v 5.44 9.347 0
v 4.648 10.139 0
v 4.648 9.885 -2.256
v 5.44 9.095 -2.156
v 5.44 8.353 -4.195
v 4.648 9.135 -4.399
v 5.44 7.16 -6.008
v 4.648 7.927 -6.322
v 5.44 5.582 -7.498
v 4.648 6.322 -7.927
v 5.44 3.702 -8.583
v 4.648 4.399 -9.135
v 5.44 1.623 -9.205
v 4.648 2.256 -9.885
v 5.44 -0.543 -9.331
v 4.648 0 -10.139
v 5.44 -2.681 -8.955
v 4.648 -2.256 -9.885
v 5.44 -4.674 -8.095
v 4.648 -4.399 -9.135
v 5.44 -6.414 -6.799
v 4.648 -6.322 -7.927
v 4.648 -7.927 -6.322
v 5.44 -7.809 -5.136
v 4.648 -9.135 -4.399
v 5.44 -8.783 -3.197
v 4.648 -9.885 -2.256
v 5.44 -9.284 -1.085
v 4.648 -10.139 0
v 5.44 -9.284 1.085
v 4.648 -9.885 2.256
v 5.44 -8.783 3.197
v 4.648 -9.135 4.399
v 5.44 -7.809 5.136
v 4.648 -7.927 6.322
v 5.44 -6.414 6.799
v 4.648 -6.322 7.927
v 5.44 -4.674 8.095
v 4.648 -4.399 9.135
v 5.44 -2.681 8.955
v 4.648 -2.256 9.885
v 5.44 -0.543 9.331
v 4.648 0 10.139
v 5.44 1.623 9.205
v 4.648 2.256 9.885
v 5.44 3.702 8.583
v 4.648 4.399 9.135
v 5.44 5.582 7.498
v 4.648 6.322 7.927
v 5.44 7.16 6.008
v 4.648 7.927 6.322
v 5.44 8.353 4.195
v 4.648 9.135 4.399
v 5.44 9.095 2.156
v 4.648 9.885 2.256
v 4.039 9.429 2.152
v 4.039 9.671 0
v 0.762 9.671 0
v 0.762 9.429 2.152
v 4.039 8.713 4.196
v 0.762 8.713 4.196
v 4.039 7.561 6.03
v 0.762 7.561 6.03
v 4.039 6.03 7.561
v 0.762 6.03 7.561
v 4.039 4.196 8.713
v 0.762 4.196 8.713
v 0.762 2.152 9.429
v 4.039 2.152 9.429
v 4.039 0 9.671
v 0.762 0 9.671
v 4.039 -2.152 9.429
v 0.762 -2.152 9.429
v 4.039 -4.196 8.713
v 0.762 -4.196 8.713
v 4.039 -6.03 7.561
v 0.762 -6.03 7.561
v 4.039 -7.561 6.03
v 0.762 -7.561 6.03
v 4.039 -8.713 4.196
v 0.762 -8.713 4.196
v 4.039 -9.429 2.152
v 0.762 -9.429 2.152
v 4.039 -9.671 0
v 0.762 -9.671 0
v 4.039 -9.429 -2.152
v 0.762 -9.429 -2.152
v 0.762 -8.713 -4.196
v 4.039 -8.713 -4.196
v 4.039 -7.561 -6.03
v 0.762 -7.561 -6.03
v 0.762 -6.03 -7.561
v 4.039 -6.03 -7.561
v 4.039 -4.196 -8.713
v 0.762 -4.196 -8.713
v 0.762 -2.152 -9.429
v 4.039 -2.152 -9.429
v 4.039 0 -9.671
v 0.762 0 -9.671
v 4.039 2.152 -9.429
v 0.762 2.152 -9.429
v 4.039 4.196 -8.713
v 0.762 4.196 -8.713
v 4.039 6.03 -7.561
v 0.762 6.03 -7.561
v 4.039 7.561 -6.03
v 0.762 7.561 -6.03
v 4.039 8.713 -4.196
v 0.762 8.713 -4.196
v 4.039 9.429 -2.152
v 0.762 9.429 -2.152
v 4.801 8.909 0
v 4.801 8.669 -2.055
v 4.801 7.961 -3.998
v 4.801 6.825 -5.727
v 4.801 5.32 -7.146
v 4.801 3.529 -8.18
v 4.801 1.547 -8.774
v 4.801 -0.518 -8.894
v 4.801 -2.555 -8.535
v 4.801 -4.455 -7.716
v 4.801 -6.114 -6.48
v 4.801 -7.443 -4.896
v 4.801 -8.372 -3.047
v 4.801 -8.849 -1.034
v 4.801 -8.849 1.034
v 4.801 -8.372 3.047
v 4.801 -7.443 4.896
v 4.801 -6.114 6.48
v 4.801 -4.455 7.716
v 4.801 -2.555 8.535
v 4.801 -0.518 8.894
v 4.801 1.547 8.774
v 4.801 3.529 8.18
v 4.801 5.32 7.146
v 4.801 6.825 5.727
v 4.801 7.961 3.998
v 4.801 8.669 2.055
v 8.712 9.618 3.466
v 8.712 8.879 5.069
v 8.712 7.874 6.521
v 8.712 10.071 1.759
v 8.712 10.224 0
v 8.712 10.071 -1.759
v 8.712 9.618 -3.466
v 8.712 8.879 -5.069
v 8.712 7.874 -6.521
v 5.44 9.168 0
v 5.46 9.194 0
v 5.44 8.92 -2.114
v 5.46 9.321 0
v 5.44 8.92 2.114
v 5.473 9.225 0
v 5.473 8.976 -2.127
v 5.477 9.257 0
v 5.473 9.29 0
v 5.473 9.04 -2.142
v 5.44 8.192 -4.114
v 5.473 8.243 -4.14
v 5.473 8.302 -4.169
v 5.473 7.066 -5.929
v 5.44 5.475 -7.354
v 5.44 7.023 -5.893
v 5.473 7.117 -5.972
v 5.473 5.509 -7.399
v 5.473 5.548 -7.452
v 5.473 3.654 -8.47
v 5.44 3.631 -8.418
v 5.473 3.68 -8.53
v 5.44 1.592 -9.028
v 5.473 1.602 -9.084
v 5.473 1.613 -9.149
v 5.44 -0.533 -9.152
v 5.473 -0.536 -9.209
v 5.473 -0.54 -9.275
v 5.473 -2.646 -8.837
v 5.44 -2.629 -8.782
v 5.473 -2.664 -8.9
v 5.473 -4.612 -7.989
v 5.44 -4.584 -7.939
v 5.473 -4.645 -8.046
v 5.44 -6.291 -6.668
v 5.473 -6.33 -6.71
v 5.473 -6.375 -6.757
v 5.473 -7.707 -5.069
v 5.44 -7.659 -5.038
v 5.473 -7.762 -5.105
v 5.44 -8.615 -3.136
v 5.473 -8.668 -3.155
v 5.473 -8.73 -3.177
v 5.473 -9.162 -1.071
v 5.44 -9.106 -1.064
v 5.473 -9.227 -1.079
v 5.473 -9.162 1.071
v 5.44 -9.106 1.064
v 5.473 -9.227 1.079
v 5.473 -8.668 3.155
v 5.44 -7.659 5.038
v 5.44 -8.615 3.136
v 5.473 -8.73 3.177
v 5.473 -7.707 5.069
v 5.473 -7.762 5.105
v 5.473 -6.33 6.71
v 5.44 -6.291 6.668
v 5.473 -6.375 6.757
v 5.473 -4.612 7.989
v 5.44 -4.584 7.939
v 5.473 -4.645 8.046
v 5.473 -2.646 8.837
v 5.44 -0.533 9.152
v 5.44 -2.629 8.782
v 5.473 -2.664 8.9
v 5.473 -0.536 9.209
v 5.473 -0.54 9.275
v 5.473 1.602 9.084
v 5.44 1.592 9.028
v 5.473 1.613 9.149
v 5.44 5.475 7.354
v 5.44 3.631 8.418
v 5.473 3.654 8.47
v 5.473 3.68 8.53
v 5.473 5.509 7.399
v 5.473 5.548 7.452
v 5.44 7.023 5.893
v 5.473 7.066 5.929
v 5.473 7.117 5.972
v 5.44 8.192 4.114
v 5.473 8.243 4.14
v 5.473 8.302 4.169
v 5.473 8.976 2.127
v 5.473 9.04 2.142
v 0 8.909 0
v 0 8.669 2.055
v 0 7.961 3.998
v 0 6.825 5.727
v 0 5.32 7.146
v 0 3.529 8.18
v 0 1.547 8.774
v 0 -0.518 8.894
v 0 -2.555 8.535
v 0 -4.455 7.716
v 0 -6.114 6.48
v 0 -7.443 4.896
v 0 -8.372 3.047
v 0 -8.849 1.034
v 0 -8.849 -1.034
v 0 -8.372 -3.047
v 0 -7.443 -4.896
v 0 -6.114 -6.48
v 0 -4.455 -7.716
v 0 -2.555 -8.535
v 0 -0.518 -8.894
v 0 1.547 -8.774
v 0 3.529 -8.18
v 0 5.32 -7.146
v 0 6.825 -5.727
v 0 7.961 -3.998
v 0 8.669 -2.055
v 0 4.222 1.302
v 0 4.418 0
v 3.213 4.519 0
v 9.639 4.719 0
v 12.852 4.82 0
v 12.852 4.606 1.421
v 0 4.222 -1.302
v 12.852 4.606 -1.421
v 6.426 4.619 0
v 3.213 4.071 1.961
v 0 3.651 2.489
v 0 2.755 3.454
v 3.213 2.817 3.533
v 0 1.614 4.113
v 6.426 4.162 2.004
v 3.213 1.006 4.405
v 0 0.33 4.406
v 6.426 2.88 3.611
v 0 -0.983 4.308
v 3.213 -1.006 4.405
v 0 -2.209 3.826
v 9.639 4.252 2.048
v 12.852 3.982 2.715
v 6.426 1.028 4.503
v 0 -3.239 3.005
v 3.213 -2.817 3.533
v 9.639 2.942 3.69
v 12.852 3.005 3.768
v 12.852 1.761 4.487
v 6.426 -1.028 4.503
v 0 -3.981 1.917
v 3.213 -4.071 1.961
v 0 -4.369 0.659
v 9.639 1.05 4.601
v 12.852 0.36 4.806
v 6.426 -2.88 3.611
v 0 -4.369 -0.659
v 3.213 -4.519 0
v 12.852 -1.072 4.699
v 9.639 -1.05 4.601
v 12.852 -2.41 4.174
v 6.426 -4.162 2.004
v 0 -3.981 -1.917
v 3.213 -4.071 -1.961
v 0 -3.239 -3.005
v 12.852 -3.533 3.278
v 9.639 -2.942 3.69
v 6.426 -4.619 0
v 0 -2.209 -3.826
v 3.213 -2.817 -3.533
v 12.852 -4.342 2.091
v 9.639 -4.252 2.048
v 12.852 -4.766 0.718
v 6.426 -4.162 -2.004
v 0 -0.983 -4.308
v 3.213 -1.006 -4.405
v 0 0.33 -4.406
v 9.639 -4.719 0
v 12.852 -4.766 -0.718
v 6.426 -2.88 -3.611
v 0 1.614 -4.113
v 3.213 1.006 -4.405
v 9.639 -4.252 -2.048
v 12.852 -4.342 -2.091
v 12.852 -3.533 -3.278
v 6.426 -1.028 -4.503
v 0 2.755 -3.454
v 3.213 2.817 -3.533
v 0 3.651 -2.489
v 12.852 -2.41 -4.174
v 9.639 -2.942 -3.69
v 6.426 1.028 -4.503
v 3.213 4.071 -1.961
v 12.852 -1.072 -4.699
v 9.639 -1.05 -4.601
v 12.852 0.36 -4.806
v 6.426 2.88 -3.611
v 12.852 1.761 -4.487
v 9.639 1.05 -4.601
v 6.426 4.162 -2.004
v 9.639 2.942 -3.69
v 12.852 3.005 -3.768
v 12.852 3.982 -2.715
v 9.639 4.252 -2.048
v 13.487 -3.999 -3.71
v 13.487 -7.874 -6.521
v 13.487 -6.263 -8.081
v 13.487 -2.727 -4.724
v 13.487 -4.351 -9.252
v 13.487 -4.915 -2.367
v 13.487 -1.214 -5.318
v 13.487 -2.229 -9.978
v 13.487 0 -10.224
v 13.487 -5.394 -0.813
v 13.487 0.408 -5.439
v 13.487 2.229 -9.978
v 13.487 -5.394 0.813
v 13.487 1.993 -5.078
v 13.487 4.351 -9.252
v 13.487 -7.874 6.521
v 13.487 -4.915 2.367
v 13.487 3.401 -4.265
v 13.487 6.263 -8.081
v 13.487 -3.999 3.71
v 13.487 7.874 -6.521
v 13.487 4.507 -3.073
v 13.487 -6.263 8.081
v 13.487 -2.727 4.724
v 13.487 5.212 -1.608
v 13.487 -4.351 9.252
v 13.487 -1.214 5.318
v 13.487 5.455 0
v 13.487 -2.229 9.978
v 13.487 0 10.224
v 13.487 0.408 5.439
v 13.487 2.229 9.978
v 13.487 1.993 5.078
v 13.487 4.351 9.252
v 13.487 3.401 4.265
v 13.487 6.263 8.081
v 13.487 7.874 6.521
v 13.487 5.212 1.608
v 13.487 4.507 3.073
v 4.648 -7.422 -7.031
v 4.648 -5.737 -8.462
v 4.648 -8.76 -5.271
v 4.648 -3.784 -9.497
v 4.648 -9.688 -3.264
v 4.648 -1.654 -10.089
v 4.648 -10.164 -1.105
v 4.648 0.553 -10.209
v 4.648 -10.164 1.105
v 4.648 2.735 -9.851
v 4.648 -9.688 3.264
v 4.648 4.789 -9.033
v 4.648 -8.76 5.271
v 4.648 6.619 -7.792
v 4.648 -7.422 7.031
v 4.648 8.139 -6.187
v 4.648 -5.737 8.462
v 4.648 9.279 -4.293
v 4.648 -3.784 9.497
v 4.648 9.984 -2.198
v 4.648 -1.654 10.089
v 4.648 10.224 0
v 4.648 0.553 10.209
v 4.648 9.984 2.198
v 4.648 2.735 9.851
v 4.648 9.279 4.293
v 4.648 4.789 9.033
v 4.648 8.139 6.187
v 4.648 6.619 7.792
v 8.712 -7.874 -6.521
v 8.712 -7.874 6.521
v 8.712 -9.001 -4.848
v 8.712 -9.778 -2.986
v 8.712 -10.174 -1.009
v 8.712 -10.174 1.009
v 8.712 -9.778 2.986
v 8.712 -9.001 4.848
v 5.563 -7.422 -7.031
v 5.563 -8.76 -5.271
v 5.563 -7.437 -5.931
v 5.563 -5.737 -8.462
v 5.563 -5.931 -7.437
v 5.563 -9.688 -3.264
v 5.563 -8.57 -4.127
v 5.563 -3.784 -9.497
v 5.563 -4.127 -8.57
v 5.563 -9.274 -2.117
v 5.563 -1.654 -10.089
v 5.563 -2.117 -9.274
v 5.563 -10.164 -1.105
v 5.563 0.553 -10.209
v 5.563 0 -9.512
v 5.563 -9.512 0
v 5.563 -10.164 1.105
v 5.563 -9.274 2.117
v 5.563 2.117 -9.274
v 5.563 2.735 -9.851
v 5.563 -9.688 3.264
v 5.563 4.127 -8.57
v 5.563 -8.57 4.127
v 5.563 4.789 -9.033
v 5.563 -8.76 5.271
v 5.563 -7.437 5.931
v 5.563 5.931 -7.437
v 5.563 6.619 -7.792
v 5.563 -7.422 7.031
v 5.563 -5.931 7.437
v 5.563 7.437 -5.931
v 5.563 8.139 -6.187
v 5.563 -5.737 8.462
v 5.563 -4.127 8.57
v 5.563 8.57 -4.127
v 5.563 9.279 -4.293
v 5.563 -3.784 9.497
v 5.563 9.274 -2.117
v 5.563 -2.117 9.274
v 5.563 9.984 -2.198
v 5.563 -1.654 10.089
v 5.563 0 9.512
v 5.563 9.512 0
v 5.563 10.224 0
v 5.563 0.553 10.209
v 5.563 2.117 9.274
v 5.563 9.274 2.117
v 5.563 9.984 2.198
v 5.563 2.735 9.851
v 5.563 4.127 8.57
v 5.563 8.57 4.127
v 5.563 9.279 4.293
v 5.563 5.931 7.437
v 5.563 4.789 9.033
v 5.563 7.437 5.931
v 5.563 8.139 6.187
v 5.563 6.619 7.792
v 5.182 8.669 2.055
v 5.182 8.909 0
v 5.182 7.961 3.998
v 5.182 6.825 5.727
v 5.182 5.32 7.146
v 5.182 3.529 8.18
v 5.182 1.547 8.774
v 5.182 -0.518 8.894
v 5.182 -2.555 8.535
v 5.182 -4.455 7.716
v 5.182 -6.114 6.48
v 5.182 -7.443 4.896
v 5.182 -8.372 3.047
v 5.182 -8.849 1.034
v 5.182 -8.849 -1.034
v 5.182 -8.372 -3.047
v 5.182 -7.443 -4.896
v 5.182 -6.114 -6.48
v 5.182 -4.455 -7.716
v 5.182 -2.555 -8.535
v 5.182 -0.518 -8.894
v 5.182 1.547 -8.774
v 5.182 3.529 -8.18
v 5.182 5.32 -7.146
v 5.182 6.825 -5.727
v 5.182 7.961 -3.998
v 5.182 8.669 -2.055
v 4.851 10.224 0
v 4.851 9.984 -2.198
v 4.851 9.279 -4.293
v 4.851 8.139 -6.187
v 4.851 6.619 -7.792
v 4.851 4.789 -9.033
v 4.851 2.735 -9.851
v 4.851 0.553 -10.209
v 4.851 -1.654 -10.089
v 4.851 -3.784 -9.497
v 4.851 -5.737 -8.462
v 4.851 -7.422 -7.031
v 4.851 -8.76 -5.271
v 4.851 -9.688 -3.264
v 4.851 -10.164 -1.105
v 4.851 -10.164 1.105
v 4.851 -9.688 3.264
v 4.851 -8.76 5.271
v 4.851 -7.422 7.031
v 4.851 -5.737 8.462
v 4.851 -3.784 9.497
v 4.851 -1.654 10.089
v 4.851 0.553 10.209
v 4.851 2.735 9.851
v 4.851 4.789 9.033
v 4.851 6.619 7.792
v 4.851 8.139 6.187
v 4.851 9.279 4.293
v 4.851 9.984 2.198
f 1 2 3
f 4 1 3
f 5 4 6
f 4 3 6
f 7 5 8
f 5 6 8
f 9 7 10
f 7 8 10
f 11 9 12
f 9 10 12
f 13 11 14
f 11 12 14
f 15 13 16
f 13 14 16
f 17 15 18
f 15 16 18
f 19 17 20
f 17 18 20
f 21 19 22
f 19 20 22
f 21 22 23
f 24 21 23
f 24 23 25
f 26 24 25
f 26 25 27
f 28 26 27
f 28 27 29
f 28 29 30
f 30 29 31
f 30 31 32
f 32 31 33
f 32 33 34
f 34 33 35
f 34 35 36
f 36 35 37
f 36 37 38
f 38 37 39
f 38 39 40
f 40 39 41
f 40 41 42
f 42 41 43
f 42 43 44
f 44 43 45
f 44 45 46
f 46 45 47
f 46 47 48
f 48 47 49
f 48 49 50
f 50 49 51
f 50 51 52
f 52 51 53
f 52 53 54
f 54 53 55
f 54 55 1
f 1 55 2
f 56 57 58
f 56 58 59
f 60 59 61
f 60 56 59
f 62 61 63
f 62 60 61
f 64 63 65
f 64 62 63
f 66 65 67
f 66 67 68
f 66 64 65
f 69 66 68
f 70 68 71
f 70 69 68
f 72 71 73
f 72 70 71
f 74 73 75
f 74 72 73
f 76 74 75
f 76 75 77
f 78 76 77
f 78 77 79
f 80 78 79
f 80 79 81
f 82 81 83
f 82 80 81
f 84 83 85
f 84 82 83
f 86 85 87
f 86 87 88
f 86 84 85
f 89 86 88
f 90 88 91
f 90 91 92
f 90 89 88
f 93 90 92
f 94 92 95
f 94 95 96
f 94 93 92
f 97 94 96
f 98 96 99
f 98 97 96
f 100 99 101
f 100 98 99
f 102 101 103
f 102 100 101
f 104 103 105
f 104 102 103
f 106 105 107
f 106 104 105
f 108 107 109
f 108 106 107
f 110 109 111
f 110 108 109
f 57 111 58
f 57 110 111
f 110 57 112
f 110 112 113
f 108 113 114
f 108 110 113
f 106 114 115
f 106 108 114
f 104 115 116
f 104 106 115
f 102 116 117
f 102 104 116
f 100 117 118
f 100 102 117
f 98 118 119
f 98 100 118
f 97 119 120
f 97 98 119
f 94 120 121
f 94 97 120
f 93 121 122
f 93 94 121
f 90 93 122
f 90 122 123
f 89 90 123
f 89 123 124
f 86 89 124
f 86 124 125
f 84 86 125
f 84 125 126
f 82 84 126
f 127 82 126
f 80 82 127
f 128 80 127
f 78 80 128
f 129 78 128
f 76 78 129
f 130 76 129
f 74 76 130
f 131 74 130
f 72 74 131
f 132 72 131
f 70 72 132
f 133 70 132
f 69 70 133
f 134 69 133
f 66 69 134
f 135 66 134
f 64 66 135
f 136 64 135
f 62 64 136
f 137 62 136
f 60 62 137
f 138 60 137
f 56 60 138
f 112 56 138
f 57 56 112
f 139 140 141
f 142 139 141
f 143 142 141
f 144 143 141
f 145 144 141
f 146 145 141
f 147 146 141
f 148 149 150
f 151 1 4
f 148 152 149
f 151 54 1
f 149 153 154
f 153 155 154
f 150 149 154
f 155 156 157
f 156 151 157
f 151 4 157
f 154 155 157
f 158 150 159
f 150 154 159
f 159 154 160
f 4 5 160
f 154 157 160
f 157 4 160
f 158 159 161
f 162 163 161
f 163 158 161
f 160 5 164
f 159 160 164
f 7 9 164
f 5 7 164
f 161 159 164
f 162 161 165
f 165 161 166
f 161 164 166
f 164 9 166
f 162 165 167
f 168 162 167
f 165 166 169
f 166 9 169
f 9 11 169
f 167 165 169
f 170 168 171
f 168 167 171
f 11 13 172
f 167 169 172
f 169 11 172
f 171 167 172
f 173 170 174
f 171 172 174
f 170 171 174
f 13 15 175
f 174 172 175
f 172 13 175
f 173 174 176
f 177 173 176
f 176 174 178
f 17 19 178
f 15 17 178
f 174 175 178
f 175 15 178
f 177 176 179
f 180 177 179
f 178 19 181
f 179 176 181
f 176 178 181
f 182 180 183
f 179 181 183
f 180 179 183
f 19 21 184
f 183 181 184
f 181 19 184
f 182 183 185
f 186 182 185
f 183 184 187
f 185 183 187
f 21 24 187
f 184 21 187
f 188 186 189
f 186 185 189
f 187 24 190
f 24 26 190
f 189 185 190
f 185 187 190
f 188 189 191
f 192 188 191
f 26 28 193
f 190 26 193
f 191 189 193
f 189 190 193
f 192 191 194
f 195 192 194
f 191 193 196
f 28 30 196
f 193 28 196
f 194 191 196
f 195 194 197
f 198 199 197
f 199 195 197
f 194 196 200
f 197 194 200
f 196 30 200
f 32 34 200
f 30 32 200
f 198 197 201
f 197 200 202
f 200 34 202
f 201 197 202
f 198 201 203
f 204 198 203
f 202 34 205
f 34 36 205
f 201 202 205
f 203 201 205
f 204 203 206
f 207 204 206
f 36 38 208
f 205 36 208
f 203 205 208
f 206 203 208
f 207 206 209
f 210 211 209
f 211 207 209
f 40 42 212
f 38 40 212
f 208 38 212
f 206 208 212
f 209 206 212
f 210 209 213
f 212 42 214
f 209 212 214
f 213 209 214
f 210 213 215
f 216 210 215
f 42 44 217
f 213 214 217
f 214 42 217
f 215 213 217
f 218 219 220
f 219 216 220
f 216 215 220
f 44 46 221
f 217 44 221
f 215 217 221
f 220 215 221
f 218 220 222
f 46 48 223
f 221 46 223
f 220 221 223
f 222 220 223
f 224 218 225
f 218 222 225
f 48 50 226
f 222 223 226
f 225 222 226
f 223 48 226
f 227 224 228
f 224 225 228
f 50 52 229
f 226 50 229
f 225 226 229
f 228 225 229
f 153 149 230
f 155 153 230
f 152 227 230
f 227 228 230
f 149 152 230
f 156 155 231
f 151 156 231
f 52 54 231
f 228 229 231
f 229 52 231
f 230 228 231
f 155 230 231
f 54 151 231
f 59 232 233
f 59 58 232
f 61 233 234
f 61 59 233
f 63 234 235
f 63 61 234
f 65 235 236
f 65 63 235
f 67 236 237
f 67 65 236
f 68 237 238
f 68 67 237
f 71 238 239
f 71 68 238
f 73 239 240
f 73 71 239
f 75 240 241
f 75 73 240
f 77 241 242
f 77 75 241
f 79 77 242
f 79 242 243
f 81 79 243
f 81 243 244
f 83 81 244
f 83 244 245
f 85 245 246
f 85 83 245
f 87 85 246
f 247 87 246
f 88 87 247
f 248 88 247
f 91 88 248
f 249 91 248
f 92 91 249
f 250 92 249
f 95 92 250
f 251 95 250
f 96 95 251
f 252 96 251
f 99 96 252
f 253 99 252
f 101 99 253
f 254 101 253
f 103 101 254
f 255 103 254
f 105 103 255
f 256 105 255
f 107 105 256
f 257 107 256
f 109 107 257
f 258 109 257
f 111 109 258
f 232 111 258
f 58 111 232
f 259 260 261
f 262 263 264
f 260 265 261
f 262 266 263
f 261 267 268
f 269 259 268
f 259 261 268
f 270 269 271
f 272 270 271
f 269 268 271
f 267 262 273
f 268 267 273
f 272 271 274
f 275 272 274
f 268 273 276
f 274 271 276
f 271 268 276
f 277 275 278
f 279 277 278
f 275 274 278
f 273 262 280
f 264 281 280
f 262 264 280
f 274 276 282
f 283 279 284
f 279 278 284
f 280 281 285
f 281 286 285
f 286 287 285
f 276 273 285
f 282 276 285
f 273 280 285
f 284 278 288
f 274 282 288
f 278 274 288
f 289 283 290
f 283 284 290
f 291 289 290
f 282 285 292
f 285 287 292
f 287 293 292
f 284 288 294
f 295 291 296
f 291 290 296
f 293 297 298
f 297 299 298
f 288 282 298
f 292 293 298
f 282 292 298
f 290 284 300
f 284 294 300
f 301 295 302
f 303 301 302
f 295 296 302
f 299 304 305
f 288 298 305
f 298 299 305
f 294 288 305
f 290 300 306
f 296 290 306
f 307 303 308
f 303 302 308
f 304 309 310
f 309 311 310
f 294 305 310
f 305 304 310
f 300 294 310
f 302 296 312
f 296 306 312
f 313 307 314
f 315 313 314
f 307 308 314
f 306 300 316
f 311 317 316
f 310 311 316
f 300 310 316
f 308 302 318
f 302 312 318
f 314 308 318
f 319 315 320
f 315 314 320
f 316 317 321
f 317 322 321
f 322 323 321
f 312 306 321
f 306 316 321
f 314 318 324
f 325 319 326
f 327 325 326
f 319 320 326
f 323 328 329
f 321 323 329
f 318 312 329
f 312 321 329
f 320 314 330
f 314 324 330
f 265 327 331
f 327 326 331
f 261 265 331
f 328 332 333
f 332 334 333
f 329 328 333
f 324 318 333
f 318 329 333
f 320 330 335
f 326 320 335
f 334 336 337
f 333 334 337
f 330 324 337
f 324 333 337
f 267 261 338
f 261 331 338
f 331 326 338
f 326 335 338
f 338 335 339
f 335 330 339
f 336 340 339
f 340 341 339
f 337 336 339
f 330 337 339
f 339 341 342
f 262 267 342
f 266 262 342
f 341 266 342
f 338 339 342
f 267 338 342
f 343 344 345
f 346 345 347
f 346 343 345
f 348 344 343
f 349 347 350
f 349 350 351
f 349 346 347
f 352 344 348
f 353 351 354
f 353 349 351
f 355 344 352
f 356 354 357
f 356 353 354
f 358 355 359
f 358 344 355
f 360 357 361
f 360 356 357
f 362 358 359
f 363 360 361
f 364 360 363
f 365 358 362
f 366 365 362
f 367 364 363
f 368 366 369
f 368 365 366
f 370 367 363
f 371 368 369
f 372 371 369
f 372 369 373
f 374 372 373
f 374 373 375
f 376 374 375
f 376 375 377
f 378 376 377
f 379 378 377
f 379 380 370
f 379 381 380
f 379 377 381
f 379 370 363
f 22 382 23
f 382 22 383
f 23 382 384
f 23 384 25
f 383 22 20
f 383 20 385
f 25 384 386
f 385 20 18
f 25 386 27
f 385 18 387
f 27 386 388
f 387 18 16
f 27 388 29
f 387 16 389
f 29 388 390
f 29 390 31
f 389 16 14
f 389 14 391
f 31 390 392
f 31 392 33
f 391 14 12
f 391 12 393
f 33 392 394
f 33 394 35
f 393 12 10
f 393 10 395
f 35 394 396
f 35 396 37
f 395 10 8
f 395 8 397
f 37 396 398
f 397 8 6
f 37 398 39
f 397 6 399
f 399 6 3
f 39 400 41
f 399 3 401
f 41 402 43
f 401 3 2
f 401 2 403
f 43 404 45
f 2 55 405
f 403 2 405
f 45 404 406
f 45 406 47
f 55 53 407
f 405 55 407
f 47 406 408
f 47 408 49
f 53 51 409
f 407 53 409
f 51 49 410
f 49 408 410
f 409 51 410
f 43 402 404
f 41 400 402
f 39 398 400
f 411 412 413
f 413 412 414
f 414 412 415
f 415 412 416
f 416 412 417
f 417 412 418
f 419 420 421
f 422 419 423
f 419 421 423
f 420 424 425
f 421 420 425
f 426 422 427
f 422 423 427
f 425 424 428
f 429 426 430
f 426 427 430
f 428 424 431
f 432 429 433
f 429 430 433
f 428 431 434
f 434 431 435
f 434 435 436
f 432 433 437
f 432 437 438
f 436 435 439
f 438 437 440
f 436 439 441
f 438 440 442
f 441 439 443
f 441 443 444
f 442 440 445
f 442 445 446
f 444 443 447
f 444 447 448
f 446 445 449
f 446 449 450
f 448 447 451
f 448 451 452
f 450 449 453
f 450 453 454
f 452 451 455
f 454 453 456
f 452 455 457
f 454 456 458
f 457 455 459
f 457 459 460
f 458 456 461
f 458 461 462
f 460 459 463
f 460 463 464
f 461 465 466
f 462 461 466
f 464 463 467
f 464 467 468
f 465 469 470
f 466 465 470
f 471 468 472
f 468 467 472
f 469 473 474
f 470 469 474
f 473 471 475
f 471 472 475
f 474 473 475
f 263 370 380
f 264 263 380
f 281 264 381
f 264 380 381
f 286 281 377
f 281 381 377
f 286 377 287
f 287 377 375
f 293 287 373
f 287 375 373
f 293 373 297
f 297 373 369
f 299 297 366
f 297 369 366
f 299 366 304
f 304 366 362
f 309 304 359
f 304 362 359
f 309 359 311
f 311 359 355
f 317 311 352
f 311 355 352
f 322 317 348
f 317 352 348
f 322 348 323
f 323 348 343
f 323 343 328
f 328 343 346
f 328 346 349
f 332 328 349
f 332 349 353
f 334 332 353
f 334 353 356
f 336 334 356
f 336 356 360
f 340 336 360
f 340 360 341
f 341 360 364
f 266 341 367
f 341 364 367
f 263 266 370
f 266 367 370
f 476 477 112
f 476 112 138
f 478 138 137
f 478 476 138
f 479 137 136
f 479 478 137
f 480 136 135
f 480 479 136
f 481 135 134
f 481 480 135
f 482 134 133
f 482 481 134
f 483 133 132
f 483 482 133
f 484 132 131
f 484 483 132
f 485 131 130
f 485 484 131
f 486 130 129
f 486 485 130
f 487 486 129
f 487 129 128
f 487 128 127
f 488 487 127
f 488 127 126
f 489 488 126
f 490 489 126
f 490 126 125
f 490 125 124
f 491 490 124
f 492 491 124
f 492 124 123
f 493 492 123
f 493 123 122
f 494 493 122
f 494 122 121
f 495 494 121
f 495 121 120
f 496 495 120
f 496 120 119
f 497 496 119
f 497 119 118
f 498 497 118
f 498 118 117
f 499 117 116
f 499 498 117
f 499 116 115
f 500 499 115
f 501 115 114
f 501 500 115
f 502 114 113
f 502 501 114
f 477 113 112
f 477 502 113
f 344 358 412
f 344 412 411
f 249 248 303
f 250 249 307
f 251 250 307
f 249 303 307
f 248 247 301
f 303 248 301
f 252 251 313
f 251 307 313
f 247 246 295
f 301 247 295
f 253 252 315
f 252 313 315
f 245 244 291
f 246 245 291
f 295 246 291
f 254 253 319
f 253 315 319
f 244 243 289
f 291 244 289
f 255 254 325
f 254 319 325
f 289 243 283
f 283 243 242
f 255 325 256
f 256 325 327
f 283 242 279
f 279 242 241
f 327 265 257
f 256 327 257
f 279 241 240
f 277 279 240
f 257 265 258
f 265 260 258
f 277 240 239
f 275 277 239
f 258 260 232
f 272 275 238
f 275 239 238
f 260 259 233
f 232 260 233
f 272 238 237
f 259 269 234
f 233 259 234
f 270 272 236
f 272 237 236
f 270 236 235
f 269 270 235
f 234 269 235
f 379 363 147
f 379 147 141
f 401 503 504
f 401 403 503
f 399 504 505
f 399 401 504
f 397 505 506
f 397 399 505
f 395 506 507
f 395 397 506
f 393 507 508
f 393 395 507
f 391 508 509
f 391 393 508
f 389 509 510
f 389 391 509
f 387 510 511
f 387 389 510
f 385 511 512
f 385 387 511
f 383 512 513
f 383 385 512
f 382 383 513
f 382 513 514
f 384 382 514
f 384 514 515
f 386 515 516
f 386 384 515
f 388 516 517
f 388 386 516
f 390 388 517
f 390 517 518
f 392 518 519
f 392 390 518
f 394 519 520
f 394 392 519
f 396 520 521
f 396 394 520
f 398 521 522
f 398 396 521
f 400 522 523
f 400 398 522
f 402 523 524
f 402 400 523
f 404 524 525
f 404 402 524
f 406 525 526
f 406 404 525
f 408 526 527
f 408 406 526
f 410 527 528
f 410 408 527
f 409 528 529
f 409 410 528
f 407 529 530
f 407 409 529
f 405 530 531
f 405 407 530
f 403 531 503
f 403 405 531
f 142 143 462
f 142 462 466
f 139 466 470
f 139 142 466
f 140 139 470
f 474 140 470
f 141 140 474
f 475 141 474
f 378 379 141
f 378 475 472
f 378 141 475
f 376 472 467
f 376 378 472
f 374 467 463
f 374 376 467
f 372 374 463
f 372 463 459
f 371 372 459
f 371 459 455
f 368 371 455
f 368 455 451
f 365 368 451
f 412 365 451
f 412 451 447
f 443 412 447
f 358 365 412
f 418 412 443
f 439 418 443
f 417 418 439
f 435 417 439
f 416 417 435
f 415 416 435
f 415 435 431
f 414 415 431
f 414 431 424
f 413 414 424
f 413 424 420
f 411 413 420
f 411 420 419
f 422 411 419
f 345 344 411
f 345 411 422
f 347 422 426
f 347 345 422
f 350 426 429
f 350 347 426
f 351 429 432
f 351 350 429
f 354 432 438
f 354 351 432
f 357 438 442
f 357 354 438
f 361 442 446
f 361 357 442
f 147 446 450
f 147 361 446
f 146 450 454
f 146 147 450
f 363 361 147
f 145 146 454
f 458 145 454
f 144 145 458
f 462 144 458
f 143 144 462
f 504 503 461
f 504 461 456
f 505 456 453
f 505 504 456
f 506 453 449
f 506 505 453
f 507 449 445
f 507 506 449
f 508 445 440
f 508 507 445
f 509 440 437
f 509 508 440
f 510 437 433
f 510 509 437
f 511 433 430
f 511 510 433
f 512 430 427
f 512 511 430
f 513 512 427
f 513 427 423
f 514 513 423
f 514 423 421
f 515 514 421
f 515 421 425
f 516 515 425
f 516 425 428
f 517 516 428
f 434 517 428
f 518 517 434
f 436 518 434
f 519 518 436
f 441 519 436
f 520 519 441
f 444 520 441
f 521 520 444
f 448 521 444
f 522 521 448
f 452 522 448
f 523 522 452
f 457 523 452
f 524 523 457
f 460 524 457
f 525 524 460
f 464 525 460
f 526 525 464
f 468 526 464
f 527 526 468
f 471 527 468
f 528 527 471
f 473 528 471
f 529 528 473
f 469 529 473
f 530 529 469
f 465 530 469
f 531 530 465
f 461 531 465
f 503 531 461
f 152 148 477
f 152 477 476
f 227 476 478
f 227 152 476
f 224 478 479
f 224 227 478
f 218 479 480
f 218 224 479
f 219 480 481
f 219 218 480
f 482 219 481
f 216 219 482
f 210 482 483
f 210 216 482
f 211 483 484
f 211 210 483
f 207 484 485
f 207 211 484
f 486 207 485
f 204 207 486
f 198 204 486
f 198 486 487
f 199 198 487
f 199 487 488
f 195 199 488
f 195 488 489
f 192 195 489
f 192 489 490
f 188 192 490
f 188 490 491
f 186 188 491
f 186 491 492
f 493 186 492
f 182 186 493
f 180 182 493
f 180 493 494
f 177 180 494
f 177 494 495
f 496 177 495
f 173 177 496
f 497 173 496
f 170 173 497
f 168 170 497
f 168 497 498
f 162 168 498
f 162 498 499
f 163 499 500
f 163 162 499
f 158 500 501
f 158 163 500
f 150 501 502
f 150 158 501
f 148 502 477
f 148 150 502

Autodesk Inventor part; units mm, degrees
sketch "Sketch_1" plane through (0, 0, 0) normal (0, 0, 1) x (1, 0, 0)
  line L0 (13.4874, 0) -> (0, 0)
  line L1 (0, 0) -> (0, 8.9091)
  line L2 (0, 8.9091) -> (0.762, 9.671)
  line L3 (0.762, 9.671) -> (4.0386, 9.671)
  line L4 (4.0386, 9.671) -> (4.8006, 8.9091)
  line L5 (4.8006, 8.9091) -> (5.5626, 8.9091)
  line L6 (5.5626, 8.9091) -> (5.5626, 10.2235)
  line L7 (5.5626, 10.2235) -> (13.4874, 10.2235)
  line L8 (13.4874, 10.2235) -> (13.4874, 0)
  line L9 (13.4874, 0) -> (0, 0)
revolve "Revolution1" add sketch "Sketch_1" angle 360 about axis through (13.4874, 0, 0) along (1, 0, 0)
sketch "Sketch_6" plane through (0, 0, 0) normal (0, 0, 1) x (1, 0, 0)
  line L0 (13.4874, 0) -> (0, 0)
  line L1 (0, 0) -> (0, 4.3688)
  line L2 (0, 4.3688) -> (-1.5889, 4.3688)
  line L3 (-1.5889, 4.3688) -> (12.8524, 4.8197)
  line L4 (12.8524, 4.8197) -> (13.4874, 5.4547)
  line L5 (13.4874, 5.4547) -> (13.4874, 0)
  line L6 (13.4874, 0) -> (0, 0)
revolve "Revolution2" cut sketch "Sketch_6" angle 360 about axis through (13.4874, 0, 0) along (1, 0, 0)
thread "Thread1" size "1/8" designation "1/8 - 27 NPT" standard "NPT" length 7.0392
sketch "Sketch_5" plane through (13.4874, 0, 0) normal (1, 0, 0) x (0, 0, -1)
  line L0 (-40.894, -20.447) -> (40.894, -20.447)
  line L1 (40.894, -20.447) -> (40.894, 20.447)
  line L2 (40.894, 20.447) -> (-40.894, 20.447)
  line L3 (-40.894, 20.447) -> (-40.894, -20.447)
  line L4 (-20.447, -7.874) -> (20.447, -7.874)
  line L5 (20.447, -7.874) -> (20.447, 7.874)
  line L6 (20.447, 7.874) -> (-20.447, 7.874)
  line L7 (-20.447, 7.874) -> (-20.447, -7.874)
extrude "Extrusion1" cut sketch "Sketch_5" against normal blind 4.7752
sketch "Sketch_24" plane through (0, 0, 0) normal (0, 0, 1) x (1, 0, 0)
  line L0 (5.5626, 0) -> (4.8006, 0)
  line L1 (4.6479, 10.2235) -> (4.6479, 10.1393)
  line L2 (4.6479, 10.1393) -> (5.4401, 9.3472)
  arc A0 (5.4401, 9.1676) -> (5.4401, 9.3472) centre (5.3503, 9.2574) ccw
  line L3 (5.4401, 9.1676) -> (5.1816, 8.9091)
  line L4 (5.1816, 8.9091) -> (4.8006, 8.9091)
  line L5 (4.8006, 8.9091) -> (4.8006, 8.655)
  line L6 (4.8006, 8.655) -> (5.5626, 8.655)
  line L7 (5.5626, 8.655) -> (5.5626, 9.512)
  line L8 (5.5626, 9.512) -> (4.8511, 10.2235)
  line L9 (4.8511, 10.2235) -> (4.6479, 10.2235)
revolve "Revolution3" add sketch "Sketch_24" angle 360 about axis through (5.5626, 0, 0) along (1, 0, 0)
ref_plane "cut1_XY" through (13.4874, 7.874, 0) normal (1, 0, 0) x (0, 0, -1)
ref_plane "cut1_YZ" through (13.4874, 7.874, 0) normal (0, 0, -1) x (0, 1, 0)
ref_plane "cut1_ZX" through (13.4874, 7.874, 0) normal (0, 1, 0) x (1, 0, 0)
ref_plane "cut2_XY" through (13.4874, -7.874, 0) normal (1, 0, 0) x (0, 0, -1)
ref_plane "cut2_YZ" through (13.4874, -7.874, 0) normal (0, 0, -1) x (0, 1, 0)
ref_plane "cut2_ZX" through (13.4874, -7.874, 0) normal (0, 1, 0) x (1, 0, 0)
ref_plane "cutf1_XY" through (13.4874, 0, 0) normal (0, 0, 1) x (1, 0, 0)
ref_plane "cutf1_YZ" through (13.4874, 0, 0) normal (1, 0, 0) x (0, 1, 0)
ref_plane "cutf1_ZX" through (13.4874, 0, 0) normal (0, 1, 0) x (0, 0, 1)
ref_plane "cutf2_XY" through (8.7122, 0, 0) normal (0, 0, 1) x (1, 0, 0)
ref_plane "cutf2_YZ" through (8.7122, 0, 0) normal (1, 0, 0) x (0, 1, 0)
ref_plane "cutf2_ZX" through (8.7122, 0, 0) normal (0, 1, 0) x (0, 0, 1)
ref_plane "lovra_XY" through (13.4874, 0, 0) normal (1, 0, 0) x (0, 1, 0)
ref_plane "lovra_YZ" through (13.4874, 0, 0) normal (0, 1, 0) x (0, 0, 1)
ref_plane "lovra_ZX" through (13.4874, 0, 0) normal (0, 0, 1) x (1, 0, 0)
ref_plane "lovra1_XY" through (8.7122, 0, 0) normal (1, 0, 0) x (0, 0, -1)
ref_plane "lovra1_YZ" through (8.7122, 0, 0) normal (0, 0, -1) x (0, 1, 0)
ref_plane "lovra1_ZX" through (8.7122, 0, 0) normal (0, 1, 0) x (1, 0, 0)
ref_plane "lovra2_XY" through (8.7122, 7.874, 0) normal (1, 0, 0) x (0, 0, -1)
ref_plane "lovra2_YZ" through (8.7122, 7.874, 0) normal (0, 0, -1) x (0, 1, 0)
ref_plane "lovra2_ZX" through (8.7122, 7.874, 0) normal (0, 1, 0) x (1, 0, 0)
ref_plane "lovra21_XY" through (0, 0, 5.2705) normal (1, 0, 0) x (0, 0, -1)
ref_plane "lovra21_YZ" through (0, 0, 5.2705) normal (0, 0, -1) x (0, 1, 0)
ref_plane "lovra21_ZX" through (0, 0, 5.2705) normal (0, 1, 0) x (1, 0, 0)
ref_plane "lovra22_XY" through (0, 0, -5.2705) normal (1, 0, 0) x (0, 0, -1)
ref_plane "lovra22_YZ" through (0, 0, -5.2705) normal (0, 0, -1) x (0, 1, 0)
ref_plane "lovra22_ZX" through (0, 0, -5.2705) normal (0, 1, 0) x (1, 0, 0)
ref_plane "lovra3_XY" through (8.7122, -7.874, 0) normal (1, 0, 0) x (0, 0, -1)
ref_plane "lovra3_YZ" through (8.7122, -7.874, 0) normal (0, 0, -1) x (0, 1, 0)
ref_plane "lovra3_ZX" through (8.7122, -7.874, 0) normal (0, 1, 0) x (1, 0, 0)
ref_plane "olen_XY" through (13.4874, 0, 0) normal (1, 0, 0) x (0, 0, -1)
ref_plane "olen_YZ" through (13.4874, 0, 0) normal (0, 0, -1) x (0, 1, 0)
ref_plane "olen_ZX" through (13.4874, 0, 0) normal (0, 1, 0) x (1, 0, 0)
ref_plane "to_mounting_bracket_XY" through (24.6126, 0, 0) normal (1, 0, 0) x (0, 0, -1)
ref_plane "to_mounting_bracket_YZ" through (24.6126, 0, 0) normal (0, 0, -1) x (0, 1, 0)
ref_plane "to_mounting_bracket_ZX" through (24.6126, 0, 0) normal (0, 1, 0) x (1, 0, 0)
ref_plane "to_nut_XY" through (0, 0, 0) normal (1, 0, 0) x (0, 0, -1)
ref_plane "to_nut_YZ" through (0, 0, 0) normal (0, 0, -1) x (0, 1, 0)
ref_plane "to_nut_ZX" through (0, 0, 0) normal (0, 1, 0) x (1, 0, 0)
ref_plane "to_pin_XY" through (33.3248, 0, 0) normal (0, 1, 0) x (1, 0, 0)
ref_plane "to_pin_YZ" through (33.3248, 0, 0) normal (1, 0, 0) x (0, 0, -1)
ref_plane "to_pin_ZX" through (33.3248, 0, 0) normal (0, 0, -1) x (0, 1, 0)
ref_plane "to_pin_1_XY" through (33.3248, 0, 0) normal (0, 0, 1) x (1, 0, 0)
ref_plane "to_pin_1_YZ" through (33.3248, 0, 0) normal (1, 0, 0) x (0, 1, 0)
ref_plane "to_pin_1_ZX" through (33.3248, 0, 0) normal (0, 1, 0) x (0, 0, 1)
ref_plane "to_pin_r_XY" through (33.3248, 0, 0) normal (0, 0, 1) x (1, 0, 0)
ref_plane "to_pin_r_YZ" through (33.3248, 0, 0) normal (1, 0, 0) x (0, 1, 0)
ref_plane "to_pin_r_ZX" through (33.3248, 0, 0) normal (0, 1, 0) x (0, 0, 1)
ref_plane "to_screw_XY" through (17.4752, 2.032, -6.0452) normal (0, 1, 0) x (1, 0, 0)
ref_plane "to_screw_YZ" through (17.4752, 2.032, -6.0452) normal (1, 0, 0) x (0, 0, -1)
ref_plane "to_screw_ZX" through (17.4752, 2.032, -6.0452) normal (0, 0, -1) x (0, 1, 0)
ref_plane "to_tube_XY" through (4.8006, 0, 0) normal (1, 0, 0) x (0, 0, -1)
ref_plane "to_tube_YZ" through (4.8006, 0, 0) normal (0, 0, -1) x (0, 1, 0)
ref_plane "to_tube_ZX" through (4.8006, 0, 0) normal (0, 1, 0) x (1, 0, 0)
properties part number "040000_rear_head"
